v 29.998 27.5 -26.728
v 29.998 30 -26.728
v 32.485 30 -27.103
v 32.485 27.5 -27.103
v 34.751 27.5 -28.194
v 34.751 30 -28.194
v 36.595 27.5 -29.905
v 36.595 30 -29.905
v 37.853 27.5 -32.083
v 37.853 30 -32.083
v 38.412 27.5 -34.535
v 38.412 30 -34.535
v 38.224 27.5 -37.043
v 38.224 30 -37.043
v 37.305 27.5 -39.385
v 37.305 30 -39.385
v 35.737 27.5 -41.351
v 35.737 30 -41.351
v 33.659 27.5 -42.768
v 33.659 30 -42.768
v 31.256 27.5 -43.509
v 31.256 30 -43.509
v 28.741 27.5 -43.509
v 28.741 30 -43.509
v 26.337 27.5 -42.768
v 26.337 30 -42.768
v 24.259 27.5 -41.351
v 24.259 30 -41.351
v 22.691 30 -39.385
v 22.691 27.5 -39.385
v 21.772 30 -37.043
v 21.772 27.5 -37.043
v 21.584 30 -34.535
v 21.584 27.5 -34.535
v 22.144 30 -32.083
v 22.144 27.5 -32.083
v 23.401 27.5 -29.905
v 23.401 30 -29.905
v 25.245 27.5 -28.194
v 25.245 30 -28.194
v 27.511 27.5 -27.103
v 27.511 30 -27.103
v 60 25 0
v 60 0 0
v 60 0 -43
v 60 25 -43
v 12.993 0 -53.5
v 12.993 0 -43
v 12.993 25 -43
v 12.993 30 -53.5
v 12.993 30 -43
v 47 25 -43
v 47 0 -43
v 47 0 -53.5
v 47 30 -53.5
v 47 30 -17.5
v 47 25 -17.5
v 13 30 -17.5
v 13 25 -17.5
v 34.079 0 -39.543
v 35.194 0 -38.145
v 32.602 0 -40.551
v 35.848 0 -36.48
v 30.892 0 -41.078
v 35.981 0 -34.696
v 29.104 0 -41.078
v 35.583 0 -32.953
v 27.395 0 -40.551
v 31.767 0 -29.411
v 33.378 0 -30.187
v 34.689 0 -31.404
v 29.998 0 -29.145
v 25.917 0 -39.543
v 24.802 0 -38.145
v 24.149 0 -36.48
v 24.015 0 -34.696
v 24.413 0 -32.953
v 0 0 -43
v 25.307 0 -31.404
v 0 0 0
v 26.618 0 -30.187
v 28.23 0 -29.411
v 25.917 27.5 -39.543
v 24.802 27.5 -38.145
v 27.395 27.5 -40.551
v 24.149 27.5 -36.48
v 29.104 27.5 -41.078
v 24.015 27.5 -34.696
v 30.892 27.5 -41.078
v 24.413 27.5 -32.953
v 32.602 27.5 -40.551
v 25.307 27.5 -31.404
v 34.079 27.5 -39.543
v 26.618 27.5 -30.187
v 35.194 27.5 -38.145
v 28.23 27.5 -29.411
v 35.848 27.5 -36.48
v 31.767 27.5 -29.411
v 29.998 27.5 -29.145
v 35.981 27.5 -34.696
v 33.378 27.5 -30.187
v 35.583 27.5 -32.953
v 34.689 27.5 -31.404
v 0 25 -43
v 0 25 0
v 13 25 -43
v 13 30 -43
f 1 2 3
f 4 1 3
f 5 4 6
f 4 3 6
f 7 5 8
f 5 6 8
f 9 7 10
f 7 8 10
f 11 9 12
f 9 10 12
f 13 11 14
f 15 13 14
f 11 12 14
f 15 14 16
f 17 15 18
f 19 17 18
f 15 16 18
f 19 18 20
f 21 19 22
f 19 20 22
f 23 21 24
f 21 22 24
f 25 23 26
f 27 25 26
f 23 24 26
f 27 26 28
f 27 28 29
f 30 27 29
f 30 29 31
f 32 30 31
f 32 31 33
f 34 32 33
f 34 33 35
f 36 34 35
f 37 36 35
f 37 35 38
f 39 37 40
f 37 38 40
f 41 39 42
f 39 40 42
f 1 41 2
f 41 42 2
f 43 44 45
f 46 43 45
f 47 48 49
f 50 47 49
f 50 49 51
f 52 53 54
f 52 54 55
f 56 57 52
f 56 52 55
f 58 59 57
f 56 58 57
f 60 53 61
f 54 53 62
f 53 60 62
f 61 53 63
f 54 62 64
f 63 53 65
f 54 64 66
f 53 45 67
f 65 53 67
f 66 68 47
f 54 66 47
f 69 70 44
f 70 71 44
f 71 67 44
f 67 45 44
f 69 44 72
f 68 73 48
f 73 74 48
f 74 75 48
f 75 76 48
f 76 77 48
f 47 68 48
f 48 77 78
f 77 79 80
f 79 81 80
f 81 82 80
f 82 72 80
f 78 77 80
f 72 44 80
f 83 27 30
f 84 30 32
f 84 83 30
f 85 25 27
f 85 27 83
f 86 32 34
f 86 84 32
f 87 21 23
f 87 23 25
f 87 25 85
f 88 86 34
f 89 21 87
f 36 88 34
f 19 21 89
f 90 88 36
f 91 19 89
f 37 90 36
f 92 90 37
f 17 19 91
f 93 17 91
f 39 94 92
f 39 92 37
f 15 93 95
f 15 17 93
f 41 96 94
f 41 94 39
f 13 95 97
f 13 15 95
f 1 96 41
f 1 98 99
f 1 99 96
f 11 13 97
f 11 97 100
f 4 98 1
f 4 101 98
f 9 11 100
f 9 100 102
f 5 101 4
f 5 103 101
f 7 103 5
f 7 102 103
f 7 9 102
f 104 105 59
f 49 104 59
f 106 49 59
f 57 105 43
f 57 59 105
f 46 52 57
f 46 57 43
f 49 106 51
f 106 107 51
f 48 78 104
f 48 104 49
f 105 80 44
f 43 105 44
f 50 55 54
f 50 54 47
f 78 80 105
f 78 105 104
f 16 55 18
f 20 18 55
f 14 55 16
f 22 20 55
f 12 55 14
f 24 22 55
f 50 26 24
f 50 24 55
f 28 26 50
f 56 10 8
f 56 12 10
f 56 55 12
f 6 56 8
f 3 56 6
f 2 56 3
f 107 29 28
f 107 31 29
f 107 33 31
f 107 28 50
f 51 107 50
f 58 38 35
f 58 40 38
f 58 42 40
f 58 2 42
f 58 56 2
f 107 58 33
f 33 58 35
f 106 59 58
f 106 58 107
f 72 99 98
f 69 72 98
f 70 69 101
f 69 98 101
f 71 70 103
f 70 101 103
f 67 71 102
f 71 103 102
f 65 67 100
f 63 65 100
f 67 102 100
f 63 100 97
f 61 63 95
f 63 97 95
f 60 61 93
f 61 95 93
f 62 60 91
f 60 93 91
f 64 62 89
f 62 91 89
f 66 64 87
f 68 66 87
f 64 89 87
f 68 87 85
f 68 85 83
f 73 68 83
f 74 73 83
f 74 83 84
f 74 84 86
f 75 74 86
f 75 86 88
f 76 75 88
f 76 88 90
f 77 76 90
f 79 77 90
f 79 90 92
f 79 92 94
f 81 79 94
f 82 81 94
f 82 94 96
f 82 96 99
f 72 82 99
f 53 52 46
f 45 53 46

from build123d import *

# Parameters (mm, degrees)
SKETCH1_W           = 60
SKETCH1_H           = 43
BOSS_EXTRUDE1_DEPTH = 25
SKETCH2_W           = 34
SKETCH2_H           = 25.5
BOSS_EXTRUDE2_DEPTH = 5
SKETCH5_W           = 34.00729927
SKETCH5_H           = 30
BOSS_EXTRUDE3_DEPTH = 10.5
SKETCH6_R           = 6
CUT_EXTRUDE1_DEPTH  = 86.803554705
SKETCH7_R           = 8.437552617
SKETCH7_R_2         = 5.978835127
CUT_EXTRUDE2_DEPTH  = 2.5


with BuildPart() as part:
    # Sketch1 → Boss-Extrude1 (new body)
    with BuildSketch(Plane(origin=(0, 0, 0), x_dir=(1, 0, 0), z_dir=(0, 1, 0))):
        with Locations((30, 21.5)):
            Rectangle(SKETCH1_W, SKETCH1_H)
    extrude(amount=BOSS_EXTRUDE1_DEPTH)

    # Sketch2 → Boss-Extrude2 (add)
    with BuildSketch(Plane(origin=(0, 25, 0), x_dir=(1, 0, 0), z_dir=(0, 1, 0))):
        with Locations((30, 30.25)):
            Rectangle(SKETCH2_W, SKETCH2_H)
    extrude(amount=BOSS_EXTRUDE2_DEPTH)

    # Sketch5 → Boss-Extrude3 (add)
    with BuildSketch(Plane(origin=(0, 0, -43), x_dir=(-1, 0, 0), z_dir=(0, 0, -1))):
        with Locations((-29.996350365, 15)):
            Rectangle(SKETCH5_W, SKETCH5_H)
    extrude(amount=BOSS_EXTRUDE3_DEPTH)

    # Sketch6 → Cut-Extrude1 (cut, through all)
    with BuildSketch(Plane(origin=(0, 30, 0), x_dir=(1, 0, 0), z_dir=(0, 1, 0))):
        with Locations(Location((29.998211201, 35.144717579, 0), (0, 0, 270))):
            Circle(SKETCH6_R)
    extrude(amount=-CUT_EXTRUDE1_DEPTH, mode=Mode.SUBTRACT)

    # Sketch7 → Cut-Extrude2 (cut, symmetric)
    with BuildSketch(Plane(origin=(0, 30, 0), x_dir=(1, 0, 0), z_dir=(0, 1, 0))):
        with Locations(Location((29.998209055, 35.165882453, 0), (0, 0, 270))):
            Circle(SKETCH7_R)
        with Locations((29.998209055, 35.165882453)):
            Circle(SKETCH7_R_2, mode=Mode.SUBTRACT)
    extrude(amount=CUT_EXTRUDE2_DEPTH, both=True, mode=Mode.SUBTRACT)


solid = part.part
